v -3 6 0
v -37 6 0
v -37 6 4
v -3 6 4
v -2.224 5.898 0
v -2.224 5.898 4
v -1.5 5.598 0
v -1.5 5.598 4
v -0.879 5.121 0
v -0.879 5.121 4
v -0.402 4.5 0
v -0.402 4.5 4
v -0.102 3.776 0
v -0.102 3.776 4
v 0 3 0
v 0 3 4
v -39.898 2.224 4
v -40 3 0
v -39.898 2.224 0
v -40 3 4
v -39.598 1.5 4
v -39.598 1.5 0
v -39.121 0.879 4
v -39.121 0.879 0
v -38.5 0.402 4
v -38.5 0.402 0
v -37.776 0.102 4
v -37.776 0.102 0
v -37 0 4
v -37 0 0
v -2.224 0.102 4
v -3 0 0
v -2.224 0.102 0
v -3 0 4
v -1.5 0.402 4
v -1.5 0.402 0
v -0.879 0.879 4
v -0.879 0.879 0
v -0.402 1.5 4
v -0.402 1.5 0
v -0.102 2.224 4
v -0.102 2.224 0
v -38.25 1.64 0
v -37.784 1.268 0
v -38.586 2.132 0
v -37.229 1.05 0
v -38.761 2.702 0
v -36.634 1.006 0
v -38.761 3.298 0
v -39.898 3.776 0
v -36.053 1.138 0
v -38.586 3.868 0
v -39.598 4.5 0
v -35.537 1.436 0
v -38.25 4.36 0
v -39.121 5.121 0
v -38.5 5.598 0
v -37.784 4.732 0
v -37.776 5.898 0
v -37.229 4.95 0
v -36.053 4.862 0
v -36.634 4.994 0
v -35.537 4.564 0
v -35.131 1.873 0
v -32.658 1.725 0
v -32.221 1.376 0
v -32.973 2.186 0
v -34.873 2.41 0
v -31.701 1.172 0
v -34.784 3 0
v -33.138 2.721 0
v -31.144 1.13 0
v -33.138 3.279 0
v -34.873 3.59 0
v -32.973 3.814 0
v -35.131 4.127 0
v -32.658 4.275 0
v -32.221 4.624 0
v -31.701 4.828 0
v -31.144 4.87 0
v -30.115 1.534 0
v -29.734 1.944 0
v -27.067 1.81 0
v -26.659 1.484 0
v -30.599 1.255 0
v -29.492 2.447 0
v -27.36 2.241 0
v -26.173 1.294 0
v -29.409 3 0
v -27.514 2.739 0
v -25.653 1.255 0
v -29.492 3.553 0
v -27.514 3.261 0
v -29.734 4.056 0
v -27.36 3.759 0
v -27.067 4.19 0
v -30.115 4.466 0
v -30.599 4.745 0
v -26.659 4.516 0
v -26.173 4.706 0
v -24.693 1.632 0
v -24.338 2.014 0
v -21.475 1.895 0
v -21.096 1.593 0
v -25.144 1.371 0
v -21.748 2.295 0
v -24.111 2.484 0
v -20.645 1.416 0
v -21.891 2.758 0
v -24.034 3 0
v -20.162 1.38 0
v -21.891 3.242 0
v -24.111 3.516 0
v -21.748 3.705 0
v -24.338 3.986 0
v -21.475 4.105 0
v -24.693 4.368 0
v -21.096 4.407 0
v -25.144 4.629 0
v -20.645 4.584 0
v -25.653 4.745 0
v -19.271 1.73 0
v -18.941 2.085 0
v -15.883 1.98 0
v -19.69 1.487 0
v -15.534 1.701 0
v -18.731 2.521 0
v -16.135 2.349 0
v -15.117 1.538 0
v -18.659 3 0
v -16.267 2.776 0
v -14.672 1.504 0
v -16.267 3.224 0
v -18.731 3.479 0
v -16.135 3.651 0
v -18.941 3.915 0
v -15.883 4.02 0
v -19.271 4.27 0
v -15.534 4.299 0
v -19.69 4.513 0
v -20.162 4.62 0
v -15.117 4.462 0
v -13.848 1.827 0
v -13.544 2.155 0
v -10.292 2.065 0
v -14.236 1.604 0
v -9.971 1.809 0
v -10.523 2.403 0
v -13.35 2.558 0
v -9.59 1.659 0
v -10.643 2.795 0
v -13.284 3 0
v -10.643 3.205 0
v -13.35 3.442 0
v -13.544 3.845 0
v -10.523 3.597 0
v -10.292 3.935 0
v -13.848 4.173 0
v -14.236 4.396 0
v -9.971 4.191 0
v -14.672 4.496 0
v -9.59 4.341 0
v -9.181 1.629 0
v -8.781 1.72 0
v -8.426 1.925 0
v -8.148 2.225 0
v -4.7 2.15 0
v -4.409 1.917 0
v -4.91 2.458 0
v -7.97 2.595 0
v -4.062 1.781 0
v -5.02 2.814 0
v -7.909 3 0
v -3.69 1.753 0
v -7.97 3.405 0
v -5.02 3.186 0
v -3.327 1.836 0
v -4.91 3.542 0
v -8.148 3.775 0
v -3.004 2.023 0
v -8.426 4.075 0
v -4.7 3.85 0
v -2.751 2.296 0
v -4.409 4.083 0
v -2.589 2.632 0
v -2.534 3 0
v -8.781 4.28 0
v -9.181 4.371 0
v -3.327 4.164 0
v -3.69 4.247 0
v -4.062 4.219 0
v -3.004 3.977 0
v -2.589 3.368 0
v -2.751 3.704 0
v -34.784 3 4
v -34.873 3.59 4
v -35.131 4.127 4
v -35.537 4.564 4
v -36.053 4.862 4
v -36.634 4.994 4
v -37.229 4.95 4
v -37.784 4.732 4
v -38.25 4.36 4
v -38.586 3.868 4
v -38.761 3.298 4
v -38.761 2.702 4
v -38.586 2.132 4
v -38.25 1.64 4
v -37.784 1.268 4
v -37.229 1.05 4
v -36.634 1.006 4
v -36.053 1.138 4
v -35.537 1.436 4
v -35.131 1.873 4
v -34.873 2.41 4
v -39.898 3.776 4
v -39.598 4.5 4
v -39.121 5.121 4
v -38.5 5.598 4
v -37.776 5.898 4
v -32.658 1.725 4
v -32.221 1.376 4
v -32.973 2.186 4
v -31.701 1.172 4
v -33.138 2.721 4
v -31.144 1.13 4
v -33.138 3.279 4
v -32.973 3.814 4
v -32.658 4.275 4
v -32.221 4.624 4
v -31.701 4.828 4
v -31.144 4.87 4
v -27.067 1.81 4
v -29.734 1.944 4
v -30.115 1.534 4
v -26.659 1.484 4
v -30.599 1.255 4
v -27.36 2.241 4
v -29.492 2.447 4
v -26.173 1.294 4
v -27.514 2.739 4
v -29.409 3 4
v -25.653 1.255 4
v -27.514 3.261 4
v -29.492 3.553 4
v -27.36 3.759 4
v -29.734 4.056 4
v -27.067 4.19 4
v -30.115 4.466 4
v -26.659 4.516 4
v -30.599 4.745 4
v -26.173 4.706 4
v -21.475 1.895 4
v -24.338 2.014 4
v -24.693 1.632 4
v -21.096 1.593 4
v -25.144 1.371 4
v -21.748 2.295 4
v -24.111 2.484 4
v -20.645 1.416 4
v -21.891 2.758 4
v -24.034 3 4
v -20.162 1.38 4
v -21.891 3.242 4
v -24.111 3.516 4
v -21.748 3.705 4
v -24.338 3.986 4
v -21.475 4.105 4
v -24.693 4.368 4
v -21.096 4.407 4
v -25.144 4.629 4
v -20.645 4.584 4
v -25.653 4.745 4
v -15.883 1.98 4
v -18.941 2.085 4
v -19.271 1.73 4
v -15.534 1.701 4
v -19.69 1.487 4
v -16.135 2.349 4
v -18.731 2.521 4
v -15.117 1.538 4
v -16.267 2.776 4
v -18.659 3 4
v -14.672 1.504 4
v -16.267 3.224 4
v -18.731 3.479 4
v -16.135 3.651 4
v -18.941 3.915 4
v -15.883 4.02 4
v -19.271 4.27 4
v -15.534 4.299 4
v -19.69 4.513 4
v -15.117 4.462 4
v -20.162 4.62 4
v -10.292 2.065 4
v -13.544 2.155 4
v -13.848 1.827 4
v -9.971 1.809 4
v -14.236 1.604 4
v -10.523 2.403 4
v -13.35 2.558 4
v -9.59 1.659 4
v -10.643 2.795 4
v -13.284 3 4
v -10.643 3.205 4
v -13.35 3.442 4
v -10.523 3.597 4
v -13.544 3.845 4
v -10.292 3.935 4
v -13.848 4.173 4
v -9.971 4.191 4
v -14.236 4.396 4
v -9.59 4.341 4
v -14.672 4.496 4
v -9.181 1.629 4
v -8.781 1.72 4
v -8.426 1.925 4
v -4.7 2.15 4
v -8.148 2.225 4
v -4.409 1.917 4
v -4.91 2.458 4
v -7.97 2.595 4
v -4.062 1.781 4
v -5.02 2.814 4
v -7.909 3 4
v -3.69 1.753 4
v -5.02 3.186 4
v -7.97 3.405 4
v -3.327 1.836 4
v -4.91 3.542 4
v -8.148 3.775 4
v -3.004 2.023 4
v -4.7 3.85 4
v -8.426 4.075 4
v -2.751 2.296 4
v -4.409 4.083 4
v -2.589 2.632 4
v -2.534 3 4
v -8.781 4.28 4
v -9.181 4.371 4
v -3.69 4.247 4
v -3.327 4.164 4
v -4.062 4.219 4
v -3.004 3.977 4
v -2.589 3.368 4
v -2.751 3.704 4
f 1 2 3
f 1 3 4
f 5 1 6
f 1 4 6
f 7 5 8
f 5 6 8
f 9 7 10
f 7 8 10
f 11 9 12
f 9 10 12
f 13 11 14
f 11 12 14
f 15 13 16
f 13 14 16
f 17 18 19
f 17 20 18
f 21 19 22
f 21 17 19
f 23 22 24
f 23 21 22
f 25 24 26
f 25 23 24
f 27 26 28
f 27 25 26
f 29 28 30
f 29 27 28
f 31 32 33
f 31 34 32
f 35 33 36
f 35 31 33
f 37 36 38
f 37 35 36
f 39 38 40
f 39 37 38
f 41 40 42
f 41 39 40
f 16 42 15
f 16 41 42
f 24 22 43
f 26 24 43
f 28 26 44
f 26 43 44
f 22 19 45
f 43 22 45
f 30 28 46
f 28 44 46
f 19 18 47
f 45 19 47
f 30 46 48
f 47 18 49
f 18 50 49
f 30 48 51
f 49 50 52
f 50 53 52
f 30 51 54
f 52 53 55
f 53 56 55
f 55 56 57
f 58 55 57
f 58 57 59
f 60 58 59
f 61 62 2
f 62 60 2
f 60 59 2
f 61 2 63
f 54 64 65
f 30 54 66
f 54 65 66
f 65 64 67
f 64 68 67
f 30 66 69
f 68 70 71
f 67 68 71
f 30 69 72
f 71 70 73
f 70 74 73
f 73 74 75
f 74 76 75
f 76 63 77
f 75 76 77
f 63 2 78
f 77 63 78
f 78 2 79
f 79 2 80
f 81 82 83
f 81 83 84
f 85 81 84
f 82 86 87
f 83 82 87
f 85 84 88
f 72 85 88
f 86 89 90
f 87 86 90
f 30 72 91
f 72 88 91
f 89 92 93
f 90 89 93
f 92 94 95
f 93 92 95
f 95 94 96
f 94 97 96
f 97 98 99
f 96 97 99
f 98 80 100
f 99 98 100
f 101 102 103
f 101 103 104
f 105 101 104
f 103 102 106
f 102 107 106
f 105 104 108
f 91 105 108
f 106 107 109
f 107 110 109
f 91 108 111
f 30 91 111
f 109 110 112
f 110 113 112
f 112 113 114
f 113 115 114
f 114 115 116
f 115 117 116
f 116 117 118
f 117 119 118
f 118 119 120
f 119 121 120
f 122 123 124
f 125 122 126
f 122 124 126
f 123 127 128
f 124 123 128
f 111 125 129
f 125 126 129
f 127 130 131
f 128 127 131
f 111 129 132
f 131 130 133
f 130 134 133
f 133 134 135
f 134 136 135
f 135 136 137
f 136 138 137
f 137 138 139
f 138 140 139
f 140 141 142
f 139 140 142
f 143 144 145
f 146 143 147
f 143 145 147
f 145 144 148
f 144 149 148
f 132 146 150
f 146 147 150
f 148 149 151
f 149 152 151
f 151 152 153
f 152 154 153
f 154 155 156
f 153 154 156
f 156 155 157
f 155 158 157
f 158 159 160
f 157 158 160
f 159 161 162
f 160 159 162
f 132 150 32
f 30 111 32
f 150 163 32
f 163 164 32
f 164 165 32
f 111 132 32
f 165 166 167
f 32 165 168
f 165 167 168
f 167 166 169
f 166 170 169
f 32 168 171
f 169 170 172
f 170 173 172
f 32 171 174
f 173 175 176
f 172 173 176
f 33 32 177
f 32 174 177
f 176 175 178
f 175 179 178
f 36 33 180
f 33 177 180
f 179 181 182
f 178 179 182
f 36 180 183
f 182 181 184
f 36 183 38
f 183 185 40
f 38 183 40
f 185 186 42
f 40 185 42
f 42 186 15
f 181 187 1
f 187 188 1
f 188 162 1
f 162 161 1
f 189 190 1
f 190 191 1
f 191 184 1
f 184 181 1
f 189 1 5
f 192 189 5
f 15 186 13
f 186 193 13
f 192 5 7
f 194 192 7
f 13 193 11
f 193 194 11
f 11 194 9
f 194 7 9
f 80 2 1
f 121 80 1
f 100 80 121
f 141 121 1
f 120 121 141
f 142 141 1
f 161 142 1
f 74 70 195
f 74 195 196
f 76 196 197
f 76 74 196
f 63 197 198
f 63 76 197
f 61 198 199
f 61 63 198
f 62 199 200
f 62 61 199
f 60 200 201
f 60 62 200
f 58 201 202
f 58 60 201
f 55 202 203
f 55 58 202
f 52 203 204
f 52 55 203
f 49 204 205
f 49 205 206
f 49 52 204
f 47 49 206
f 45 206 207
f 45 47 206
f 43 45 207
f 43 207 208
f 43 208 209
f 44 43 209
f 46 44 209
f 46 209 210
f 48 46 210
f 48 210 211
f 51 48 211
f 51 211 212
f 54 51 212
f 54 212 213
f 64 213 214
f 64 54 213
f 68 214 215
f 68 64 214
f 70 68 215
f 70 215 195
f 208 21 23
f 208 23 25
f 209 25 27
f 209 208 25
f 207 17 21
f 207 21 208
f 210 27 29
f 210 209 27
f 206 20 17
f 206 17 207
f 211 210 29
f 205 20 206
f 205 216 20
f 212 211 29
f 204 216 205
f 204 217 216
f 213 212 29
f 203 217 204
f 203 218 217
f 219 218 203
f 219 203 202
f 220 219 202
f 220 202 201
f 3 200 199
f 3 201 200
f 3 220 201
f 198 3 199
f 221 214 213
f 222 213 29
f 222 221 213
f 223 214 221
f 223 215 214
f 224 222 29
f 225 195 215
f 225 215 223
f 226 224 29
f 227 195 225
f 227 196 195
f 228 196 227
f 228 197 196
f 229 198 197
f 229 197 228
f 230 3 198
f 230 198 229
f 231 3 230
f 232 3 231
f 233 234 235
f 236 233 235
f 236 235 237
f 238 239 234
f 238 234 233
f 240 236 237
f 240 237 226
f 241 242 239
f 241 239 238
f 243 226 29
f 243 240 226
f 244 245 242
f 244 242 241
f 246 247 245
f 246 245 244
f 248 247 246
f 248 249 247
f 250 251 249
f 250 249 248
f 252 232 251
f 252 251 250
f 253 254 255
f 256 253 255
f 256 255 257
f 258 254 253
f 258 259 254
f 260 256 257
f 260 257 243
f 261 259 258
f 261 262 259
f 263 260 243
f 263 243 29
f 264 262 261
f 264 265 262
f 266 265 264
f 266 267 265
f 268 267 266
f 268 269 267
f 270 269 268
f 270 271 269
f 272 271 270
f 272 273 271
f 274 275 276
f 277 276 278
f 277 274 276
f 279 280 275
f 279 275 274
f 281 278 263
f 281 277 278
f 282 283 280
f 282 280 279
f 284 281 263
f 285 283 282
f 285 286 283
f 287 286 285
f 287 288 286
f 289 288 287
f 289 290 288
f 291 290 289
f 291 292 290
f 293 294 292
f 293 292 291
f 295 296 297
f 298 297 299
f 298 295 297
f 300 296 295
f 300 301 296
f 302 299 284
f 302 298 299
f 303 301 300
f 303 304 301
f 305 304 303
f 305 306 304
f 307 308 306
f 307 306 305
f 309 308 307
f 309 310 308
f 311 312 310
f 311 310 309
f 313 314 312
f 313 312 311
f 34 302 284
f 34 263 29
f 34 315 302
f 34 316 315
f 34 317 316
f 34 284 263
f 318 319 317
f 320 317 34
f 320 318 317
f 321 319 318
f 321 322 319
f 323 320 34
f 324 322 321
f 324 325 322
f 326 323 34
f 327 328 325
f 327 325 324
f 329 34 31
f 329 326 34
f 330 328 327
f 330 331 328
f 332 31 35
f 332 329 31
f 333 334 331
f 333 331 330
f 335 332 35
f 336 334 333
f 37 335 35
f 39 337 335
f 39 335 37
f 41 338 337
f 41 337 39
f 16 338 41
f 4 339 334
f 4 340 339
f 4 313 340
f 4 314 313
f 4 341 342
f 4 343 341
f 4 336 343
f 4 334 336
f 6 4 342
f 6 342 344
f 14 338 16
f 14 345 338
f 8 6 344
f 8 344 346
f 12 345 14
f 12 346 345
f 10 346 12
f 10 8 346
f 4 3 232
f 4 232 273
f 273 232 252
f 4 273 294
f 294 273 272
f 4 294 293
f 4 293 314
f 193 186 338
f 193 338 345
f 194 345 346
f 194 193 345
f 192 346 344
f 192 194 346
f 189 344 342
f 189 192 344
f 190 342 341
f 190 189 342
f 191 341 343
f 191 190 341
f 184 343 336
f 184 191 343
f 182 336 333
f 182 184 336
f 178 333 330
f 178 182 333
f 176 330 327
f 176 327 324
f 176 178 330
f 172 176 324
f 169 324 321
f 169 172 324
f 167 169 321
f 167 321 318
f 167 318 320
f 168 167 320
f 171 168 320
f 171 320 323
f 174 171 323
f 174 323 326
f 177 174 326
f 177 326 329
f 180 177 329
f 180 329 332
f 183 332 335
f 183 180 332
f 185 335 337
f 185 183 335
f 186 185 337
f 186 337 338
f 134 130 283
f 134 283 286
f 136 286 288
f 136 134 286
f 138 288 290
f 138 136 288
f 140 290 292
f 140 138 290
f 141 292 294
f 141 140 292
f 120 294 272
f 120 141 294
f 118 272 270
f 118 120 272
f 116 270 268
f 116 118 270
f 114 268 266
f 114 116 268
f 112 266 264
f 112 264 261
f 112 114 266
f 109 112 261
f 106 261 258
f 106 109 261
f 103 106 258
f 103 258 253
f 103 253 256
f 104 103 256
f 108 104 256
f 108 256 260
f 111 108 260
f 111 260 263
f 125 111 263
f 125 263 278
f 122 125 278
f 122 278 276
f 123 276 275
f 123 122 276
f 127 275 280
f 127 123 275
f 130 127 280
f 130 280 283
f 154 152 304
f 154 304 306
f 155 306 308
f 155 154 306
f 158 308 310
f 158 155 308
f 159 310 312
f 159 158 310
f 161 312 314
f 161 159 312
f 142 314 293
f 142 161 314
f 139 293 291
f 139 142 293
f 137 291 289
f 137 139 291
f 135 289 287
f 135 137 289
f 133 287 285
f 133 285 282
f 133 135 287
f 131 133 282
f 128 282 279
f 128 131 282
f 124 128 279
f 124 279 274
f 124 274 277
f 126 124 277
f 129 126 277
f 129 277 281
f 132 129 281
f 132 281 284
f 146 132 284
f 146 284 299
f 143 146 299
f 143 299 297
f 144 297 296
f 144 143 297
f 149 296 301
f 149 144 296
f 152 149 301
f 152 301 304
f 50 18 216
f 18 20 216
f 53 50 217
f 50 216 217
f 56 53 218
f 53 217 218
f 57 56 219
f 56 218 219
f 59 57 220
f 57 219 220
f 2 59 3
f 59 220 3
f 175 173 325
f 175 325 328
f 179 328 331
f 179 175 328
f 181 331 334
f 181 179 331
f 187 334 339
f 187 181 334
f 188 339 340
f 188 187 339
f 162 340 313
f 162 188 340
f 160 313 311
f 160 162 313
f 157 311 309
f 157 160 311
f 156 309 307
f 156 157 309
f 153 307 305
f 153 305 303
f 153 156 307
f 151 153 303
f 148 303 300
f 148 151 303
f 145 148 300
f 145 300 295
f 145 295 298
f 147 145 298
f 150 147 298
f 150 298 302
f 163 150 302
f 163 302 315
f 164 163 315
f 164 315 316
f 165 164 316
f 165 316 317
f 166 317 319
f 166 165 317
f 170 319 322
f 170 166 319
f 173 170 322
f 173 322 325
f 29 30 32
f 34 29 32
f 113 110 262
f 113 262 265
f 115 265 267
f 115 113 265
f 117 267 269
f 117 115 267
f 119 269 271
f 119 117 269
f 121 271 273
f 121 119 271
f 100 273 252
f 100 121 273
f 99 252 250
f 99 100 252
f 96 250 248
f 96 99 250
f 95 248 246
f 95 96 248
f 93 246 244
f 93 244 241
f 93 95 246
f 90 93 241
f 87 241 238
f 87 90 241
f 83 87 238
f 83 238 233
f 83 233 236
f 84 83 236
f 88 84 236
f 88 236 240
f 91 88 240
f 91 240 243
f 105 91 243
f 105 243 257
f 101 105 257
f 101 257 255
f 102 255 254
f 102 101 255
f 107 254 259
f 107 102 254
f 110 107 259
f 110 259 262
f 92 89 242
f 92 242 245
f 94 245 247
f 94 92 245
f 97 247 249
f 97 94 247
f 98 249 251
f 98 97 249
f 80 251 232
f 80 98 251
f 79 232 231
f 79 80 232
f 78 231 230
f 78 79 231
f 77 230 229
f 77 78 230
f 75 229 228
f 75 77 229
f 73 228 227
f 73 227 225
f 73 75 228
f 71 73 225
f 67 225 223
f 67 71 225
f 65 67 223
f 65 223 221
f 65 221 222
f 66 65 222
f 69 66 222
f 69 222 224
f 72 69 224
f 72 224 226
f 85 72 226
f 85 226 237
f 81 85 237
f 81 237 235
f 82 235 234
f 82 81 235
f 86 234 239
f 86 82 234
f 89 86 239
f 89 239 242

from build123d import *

# Parameters (mm, degrees)
F0_W     = 40
F0_H     = 6
F0_R     = 2
F0_R_2   = 1.875
F0_R_3   = 1.75
F0_R_4   = 1.625
F0_R_5   = 1.5
F0_R_6   = 1.375
F0_R_7   = 1.25
F1_DEPTH = 4
F2_R     = 2.99999


# Not quite as in the source:
# - a fillet or chamfer is up to 0.001 mm smaller than in the source, because OpenCascade refuses the exact size


with BuildPart() as f1:
    # F0 (on Top) → F1 (new body)
    with BuildSketch(Plane.XY):
        with Locations((-20, 3)):
            Rectangle(F0_W, F0_H)
        with Locations((-36.7836877704, 3)):
            Circle(F0_R, mode=Mode.SUBTRACT)
        with Locations((-31.2836877704, 3)):
            Circle(F0_R_2, mode=Mode.SUBTRACT)
        with Locations((-25.7836877704, 3)):
            Circle(F0_R_3, mode=Mode.SUBTRACT)
        with Locations((-20.2836877704, 3)):
            Circle(F0_R_4, mode=Mode.SUBTRACT)
        with Locations((-14.7836877704, 3)):
            Circle(F0_R_5, mode=Mode.SUBTRACT)
        with Locations((-9.2836877704, 3)):
            Circle(F0_R_6, mode=Mode.SUBTRACT)
        with Locations((-3.7836877704, 3)):
            Circle(F0_R_7, mode=Mode.SUBTRACT)
    extrude(amount=F1_DEPTH)

    # F2 (radius 3 in the source; OpenCascade refuses exactly that, so slightly less here)
    f2_edges = [f1.edges().sort_by_distance(p)[0] for p in [
        (0, 0, 2),
        (0, 6, 2),
        (-40, 0, 2),
        (-40, 6, 2),
    ]]
    fillet(f2_edges, radius=F2_R)


solid = f1.part
